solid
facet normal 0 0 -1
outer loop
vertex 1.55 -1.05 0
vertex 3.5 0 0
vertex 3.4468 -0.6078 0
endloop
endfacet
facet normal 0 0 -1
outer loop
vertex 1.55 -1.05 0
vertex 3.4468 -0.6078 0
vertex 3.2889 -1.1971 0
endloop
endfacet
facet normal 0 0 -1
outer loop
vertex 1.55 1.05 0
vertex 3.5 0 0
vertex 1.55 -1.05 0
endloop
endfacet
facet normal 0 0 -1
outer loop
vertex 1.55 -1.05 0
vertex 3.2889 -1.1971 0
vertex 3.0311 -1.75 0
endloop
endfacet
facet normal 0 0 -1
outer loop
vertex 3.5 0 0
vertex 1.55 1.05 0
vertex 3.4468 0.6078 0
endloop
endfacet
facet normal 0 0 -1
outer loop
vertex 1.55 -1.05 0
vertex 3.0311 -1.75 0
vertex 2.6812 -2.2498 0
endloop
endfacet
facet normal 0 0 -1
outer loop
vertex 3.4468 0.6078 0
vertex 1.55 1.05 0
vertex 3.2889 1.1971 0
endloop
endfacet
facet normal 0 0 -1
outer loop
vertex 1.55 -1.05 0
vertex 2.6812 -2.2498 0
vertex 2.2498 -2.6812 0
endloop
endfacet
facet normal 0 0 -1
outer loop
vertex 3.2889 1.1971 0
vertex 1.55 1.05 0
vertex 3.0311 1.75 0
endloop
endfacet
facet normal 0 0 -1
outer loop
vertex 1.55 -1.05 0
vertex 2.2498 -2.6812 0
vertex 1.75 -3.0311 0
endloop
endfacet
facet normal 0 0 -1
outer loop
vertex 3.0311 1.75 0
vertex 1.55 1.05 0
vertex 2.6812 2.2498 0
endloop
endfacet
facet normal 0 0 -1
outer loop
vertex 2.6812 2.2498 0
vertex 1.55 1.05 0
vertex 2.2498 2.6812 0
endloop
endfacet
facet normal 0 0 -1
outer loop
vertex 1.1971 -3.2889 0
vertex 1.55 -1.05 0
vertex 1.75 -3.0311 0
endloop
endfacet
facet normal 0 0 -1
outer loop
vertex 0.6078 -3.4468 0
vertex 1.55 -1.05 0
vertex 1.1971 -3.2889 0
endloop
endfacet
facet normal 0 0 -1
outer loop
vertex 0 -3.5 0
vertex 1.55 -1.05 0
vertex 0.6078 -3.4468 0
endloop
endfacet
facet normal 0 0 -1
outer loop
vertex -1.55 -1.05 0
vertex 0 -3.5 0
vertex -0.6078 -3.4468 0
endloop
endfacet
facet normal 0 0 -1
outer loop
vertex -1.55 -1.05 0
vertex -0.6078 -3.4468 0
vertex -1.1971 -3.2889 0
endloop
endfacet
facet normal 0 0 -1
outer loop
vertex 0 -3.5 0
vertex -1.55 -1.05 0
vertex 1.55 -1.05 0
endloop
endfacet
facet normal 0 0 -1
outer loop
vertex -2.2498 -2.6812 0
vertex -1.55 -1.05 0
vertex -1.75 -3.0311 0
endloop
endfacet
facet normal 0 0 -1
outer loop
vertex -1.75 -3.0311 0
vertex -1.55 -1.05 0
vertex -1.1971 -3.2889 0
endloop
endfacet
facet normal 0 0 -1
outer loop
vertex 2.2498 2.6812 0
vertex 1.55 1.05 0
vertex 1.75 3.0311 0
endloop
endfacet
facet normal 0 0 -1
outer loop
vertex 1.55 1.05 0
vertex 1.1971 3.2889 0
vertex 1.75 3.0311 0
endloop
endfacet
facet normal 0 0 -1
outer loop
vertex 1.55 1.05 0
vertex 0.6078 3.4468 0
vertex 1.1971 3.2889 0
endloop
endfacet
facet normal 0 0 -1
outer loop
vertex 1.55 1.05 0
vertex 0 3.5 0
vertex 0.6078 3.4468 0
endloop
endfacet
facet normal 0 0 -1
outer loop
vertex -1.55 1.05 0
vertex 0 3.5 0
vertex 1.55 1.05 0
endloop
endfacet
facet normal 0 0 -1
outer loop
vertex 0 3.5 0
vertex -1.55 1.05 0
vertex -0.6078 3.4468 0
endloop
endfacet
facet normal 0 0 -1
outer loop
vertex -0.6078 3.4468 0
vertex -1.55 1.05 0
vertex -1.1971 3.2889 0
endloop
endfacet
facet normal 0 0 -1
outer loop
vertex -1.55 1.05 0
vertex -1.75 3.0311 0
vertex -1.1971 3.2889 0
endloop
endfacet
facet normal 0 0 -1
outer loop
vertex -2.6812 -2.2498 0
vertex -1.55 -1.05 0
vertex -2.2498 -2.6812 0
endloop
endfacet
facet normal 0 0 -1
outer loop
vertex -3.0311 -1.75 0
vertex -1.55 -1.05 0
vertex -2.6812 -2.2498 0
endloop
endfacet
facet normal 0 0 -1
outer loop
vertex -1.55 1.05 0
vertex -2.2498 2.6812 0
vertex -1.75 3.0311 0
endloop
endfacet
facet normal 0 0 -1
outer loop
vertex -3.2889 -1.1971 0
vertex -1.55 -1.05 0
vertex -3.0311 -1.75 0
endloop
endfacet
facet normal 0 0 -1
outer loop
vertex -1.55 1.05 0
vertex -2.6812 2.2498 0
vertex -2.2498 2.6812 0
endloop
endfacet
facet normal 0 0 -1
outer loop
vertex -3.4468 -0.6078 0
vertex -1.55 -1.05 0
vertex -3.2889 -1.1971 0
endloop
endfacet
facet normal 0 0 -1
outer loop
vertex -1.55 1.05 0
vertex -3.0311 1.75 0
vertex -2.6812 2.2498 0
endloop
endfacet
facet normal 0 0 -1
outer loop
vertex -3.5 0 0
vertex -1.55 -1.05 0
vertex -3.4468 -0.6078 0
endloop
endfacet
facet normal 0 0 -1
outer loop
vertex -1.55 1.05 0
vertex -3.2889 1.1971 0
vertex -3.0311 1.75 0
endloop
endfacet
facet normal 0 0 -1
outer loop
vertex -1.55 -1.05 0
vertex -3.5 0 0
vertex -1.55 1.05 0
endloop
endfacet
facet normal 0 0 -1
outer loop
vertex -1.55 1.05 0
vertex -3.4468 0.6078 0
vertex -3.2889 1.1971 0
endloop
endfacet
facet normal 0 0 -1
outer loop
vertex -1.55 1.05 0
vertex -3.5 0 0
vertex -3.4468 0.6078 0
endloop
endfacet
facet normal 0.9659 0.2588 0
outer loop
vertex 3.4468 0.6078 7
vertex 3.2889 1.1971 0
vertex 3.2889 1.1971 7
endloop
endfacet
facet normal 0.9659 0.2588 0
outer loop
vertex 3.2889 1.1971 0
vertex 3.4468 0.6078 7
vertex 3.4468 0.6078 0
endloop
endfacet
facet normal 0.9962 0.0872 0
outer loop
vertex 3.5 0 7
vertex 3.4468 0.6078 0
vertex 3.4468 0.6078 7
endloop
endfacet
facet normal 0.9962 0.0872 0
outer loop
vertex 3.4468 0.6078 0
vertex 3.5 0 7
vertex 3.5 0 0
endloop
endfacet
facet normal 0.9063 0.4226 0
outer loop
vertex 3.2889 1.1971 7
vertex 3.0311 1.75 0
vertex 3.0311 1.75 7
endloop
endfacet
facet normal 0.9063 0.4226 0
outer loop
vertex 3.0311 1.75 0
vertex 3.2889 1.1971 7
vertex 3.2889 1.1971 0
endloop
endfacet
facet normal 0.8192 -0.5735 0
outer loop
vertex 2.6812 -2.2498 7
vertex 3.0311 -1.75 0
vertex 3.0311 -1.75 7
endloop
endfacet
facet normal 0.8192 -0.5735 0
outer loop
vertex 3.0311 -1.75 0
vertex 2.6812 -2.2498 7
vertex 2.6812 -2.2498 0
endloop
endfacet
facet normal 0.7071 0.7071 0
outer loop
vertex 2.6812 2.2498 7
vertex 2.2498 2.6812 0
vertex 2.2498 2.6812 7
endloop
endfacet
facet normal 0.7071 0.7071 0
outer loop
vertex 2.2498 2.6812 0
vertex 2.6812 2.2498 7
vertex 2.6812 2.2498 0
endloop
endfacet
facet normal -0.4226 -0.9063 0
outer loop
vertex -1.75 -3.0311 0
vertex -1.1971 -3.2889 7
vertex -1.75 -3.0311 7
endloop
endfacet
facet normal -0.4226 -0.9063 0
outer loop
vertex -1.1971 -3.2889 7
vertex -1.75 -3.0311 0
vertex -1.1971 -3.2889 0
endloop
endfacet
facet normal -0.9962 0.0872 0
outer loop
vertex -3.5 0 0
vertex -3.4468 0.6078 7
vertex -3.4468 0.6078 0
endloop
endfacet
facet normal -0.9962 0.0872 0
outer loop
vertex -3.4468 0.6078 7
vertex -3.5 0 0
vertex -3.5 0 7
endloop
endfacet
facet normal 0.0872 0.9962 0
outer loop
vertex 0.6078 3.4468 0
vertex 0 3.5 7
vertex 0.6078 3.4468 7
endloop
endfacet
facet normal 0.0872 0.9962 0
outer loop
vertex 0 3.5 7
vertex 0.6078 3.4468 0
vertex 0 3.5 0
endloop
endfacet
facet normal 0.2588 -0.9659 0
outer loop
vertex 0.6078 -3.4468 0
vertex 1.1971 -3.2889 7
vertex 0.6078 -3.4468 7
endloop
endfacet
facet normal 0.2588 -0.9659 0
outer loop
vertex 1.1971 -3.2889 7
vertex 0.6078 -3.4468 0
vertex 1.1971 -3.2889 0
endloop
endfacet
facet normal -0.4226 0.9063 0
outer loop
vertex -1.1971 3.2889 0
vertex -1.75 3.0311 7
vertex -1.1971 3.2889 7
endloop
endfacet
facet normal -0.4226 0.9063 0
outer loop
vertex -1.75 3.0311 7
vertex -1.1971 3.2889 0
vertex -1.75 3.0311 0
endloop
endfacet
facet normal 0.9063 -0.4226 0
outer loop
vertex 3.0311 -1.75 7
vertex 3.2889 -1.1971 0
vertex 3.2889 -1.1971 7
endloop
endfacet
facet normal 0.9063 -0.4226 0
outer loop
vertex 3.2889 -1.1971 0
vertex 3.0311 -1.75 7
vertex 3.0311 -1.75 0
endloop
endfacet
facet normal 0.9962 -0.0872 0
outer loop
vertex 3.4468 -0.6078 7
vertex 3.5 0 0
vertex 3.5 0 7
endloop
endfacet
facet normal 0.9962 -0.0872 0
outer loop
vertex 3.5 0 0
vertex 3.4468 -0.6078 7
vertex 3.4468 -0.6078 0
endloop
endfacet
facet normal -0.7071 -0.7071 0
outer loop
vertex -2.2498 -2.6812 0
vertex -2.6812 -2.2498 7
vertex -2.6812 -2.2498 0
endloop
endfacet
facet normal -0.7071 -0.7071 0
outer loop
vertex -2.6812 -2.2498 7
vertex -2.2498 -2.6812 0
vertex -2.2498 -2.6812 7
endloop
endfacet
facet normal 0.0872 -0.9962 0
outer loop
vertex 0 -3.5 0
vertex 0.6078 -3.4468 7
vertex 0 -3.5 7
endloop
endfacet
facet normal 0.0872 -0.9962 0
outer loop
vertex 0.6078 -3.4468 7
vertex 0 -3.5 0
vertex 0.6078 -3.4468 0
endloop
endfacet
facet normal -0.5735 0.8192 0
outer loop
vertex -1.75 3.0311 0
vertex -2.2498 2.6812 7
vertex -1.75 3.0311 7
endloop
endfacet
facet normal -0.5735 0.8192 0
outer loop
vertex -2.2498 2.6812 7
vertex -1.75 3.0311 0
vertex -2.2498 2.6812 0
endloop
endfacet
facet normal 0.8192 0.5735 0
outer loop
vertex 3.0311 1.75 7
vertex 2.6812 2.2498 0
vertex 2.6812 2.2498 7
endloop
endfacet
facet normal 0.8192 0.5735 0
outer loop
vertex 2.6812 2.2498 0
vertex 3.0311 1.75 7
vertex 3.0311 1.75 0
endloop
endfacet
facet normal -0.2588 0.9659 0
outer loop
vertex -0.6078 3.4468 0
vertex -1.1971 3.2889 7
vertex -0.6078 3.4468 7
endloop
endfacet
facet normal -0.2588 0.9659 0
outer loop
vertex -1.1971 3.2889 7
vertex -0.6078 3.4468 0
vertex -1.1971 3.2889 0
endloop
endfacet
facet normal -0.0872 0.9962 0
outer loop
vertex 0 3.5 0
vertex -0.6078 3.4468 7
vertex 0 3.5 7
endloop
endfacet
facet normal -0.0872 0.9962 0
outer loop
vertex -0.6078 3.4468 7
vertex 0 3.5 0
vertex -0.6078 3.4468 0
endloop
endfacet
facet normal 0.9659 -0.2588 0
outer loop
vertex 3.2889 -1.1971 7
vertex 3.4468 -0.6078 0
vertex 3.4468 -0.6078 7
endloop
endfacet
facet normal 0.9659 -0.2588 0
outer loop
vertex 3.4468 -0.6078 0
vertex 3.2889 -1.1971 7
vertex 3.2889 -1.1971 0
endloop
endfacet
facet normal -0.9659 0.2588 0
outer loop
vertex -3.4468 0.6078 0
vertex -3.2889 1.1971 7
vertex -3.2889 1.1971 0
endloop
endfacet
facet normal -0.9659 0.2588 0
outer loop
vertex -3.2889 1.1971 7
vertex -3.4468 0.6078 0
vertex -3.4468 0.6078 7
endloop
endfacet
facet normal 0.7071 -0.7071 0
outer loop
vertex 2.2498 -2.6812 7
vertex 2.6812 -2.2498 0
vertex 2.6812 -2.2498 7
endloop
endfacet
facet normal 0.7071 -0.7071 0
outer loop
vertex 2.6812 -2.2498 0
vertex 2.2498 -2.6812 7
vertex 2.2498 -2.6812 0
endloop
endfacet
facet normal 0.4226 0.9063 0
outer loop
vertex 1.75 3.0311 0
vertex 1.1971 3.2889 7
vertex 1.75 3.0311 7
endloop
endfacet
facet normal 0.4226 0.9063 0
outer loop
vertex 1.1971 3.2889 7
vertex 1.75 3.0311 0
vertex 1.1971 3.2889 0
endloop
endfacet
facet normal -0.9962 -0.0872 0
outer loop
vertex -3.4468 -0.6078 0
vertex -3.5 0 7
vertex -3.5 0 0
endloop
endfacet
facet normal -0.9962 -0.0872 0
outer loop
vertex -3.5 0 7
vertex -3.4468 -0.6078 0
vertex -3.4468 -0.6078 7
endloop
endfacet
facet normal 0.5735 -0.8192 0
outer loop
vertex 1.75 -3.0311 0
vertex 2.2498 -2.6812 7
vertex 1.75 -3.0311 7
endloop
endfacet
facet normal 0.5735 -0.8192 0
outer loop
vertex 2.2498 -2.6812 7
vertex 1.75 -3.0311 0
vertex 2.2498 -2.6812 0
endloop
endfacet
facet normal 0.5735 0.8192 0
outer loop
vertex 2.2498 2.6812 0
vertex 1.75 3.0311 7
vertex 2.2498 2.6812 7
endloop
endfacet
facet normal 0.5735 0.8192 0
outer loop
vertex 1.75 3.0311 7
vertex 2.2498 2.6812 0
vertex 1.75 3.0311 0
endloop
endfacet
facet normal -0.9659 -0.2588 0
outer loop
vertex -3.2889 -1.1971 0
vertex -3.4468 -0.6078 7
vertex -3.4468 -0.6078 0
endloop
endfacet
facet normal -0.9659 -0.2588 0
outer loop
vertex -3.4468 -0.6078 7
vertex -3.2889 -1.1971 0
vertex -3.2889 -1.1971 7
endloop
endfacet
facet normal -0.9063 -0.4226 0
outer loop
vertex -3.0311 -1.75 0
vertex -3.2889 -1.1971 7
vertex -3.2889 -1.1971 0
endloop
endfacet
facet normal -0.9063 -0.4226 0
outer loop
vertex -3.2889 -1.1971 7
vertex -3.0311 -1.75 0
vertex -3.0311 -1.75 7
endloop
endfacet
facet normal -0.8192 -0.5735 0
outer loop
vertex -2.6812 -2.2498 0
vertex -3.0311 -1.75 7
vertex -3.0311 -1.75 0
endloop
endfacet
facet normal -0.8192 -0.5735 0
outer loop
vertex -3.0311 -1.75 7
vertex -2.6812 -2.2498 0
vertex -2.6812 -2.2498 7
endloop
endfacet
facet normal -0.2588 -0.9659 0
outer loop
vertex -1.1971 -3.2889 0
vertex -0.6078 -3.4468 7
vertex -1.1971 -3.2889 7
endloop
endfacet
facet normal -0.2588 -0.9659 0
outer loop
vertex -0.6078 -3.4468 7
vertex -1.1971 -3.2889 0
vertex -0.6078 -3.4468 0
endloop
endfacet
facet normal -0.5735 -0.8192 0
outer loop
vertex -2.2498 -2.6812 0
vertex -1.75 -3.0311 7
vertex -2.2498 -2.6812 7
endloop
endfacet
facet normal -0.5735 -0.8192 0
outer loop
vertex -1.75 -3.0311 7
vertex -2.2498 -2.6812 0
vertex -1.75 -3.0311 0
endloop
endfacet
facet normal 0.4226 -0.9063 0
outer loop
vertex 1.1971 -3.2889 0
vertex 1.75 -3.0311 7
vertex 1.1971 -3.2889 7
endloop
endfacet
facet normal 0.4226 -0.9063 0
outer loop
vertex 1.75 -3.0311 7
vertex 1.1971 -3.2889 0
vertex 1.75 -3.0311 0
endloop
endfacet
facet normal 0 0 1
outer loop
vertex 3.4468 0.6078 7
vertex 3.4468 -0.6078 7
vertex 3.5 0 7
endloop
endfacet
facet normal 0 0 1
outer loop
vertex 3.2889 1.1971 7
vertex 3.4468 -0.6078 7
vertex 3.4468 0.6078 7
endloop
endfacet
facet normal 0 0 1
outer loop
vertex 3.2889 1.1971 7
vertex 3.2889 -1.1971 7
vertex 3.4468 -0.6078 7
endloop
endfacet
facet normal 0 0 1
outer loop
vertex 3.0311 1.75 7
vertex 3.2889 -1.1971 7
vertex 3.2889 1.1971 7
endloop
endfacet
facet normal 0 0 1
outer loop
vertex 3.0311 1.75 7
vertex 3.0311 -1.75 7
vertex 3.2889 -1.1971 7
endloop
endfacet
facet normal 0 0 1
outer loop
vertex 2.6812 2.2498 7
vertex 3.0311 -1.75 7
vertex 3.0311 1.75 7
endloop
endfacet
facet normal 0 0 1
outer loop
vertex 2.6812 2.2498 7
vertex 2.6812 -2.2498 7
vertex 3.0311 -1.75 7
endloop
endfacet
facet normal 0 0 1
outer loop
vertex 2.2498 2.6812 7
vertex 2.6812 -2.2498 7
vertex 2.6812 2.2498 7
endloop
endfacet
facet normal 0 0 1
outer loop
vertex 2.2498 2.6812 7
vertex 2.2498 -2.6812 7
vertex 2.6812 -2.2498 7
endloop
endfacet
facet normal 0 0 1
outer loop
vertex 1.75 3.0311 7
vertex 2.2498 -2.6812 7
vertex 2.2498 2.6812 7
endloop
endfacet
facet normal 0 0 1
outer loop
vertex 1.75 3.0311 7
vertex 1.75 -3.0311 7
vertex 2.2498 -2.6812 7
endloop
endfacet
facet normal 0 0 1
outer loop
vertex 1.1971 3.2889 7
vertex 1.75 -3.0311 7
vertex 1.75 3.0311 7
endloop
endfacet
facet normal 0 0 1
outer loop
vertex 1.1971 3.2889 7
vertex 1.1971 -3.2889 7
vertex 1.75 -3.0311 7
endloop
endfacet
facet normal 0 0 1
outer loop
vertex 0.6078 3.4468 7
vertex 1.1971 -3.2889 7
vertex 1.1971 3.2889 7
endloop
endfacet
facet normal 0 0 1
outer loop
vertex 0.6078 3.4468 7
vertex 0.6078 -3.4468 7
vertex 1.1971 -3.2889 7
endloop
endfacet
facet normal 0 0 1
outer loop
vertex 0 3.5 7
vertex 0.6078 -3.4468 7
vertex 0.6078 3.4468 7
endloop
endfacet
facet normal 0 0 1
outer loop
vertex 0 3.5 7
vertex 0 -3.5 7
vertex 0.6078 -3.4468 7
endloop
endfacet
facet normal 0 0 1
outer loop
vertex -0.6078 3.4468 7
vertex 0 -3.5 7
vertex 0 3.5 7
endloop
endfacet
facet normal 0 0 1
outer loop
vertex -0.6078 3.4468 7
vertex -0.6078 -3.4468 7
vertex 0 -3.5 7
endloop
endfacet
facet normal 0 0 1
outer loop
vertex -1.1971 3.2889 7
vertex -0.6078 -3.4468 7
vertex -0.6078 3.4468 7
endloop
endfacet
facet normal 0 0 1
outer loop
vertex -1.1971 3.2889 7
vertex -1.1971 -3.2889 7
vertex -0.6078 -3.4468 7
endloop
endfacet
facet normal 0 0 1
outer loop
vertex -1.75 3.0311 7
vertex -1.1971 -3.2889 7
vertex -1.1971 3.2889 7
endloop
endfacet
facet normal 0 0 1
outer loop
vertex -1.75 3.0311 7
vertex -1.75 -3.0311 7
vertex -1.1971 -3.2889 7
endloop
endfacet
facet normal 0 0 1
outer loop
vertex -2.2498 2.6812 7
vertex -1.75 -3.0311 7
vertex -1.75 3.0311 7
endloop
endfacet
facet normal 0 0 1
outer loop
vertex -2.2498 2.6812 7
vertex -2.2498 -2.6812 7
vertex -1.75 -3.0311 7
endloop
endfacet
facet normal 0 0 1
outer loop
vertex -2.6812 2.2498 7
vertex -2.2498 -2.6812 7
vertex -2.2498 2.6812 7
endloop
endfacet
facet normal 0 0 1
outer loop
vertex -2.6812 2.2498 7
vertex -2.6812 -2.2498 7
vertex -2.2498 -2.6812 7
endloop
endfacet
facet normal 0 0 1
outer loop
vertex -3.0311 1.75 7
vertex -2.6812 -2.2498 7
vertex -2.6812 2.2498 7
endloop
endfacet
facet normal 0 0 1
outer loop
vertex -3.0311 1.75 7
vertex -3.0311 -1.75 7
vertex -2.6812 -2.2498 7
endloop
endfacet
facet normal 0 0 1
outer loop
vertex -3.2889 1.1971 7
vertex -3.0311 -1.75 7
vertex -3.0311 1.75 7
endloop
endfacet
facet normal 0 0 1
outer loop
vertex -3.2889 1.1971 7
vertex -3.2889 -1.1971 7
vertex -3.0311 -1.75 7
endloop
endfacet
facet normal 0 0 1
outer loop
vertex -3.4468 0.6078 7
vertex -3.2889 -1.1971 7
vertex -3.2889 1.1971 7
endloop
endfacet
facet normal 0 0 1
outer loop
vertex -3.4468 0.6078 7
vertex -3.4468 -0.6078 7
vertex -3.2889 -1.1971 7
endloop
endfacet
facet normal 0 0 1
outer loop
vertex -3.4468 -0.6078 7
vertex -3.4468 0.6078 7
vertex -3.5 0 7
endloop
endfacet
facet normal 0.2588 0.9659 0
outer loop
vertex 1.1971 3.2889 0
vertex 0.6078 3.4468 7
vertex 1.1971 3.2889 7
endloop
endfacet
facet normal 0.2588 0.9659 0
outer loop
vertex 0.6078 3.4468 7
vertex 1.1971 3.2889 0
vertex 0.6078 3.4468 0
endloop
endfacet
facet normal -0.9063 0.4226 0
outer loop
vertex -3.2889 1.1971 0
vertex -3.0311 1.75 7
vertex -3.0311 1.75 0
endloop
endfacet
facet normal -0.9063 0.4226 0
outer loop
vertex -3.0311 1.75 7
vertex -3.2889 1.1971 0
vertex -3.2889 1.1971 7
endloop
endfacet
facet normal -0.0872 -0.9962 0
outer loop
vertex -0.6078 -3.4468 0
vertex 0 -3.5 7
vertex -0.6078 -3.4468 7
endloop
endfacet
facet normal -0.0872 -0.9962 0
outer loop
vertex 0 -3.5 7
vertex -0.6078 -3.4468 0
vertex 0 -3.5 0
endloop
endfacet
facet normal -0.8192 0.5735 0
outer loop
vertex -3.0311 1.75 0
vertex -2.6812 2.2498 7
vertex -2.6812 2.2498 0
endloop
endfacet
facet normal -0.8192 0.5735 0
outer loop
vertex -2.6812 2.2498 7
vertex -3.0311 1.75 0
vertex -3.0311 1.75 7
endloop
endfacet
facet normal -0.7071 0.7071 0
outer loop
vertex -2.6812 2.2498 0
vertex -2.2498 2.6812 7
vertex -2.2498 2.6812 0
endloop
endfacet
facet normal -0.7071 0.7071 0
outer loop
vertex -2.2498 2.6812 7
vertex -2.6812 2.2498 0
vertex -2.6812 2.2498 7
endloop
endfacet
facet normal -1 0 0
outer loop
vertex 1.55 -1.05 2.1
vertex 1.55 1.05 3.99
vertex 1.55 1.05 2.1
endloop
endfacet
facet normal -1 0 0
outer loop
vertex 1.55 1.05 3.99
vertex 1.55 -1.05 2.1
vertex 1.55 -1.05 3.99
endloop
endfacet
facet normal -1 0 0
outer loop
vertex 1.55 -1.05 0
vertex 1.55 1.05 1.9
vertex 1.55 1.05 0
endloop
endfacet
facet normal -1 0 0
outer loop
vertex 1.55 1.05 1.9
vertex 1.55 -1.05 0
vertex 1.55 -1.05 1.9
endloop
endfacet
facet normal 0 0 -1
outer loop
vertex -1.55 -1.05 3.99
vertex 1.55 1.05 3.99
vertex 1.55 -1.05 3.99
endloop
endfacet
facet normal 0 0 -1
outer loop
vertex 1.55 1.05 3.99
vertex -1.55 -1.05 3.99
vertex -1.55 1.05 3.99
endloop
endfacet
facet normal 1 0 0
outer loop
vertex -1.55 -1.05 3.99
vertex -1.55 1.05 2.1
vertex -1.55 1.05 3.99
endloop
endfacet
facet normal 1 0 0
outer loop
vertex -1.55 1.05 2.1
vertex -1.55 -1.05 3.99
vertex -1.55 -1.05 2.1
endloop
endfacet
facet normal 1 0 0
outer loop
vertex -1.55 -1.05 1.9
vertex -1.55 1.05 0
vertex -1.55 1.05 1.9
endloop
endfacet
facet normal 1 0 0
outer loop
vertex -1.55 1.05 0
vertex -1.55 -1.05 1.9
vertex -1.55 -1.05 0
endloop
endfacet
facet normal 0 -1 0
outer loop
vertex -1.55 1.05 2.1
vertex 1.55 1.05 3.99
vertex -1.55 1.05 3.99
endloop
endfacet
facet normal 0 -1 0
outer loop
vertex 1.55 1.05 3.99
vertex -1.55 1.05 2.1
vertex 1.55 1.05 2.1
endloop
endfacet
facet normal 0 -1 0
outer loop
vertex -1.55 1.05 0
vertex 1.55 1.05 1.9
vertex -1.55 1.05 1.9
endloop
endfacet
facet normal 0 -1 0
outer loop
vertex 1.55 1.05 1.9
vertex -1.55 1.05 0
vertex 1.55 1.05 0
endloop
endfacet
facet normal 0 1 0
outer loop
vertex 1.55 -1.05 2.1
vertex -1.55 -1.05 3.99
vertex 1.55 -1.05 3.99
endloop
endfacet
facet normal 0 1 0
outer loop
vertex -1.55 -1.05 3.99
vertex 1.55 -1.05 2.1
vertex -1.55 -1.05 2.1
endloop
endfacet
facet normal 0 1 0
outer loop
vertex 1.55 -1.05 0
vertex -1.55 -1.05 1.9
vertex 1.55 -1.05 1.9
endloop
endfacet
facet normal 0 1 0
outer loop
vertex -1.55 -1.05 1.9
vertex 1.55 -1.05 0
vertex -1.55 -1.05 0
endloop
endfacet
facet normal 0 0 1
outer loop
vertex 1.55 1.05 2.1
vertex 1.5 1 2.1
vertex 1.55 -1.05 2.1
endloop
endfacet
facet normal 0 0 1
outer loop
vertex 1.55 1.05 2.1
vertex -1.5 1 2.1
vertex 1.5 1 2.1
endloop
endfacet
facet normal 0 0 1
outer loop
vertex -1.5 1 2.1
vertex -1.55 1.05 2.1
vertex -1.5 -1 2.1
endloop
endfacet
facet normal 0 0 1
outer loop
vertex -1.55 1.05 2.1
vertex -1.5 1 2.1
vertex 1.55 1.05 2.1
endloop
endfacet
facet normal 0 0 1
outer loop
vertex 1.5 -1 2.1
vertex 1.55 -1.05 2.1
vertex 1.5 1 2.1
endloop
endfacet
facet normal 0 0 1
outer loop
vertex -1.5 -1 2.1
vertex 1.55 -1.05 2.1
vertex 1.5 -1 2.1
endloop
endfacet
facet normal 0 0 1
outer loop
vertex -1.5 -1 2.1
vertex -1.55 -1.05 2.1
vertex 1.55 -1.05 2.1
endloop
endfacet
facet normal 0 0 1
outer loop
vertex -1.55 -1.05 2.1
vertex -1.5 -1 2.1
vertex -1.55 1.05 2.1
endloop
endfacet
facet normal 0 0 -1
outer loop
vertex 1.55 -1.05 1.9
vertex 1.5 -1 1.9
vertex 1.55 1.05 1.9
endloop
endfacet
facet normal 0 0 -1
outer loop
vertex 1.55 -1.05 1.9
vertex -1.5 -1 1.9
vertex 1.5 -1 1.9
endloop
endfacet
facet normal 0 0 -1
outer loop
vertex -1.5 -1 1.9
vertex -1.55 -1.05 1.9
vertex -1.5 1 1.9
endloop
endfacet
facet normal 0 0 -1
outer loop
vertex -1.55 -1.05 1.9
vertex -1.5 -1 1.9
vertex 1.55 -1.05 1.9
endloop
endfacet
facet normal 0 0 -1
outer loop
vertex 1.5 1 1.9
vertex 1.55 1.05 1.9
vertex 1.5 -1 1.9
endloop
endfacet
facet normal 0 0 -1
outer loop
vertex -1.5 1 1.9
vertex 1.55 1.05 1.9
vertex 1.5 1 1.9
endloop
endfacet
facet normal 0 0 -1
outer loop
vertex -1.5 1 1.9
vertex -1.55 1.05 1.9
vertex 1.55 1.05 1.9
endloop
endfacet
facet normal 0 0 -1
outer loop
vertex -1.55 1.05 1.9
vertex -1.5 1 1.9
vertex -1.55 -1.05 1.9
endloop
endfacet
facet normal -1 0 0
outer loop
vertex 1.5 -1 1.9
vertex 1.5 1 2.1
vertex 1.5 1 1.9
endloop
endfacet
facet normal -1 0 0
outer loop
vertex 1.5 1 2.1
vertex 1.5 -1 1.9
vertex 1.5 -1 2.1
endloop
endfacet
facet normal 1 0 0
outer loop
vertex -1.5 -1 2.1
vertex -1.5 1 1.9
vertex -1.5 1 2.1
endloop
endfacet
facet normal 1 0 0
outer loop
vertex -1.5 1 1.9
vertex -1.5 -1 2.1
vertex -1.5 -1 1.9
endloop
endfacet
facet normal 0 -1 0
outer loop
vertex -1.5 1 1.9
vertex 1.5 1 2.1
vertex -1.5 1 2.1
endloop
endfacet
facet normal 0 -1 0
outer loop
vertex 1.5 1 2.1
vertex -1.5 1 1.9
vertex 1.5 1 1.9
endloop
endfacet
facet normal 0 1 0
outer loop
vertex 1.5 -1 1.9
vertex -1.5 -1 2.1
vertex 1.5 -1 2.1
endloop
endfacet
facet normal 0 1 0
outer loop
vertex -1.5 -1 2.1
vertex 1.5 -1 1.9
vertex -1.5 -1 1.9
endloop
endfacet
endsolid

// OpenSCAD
// Push Button Cap for 8mm hole and 3x2mm switch stem

$fn=36;

union() {
    difference() {
        translate([0,0,3.5]) {
            cylinder(7, 3.5, 3.5, center=true);
        }
        translate([0, 0, 1.99]) {
            cube([3.1, 2.1, 4], center=true);
        }
    }
    color([0,0,1]) {
        difference() {
            translate([0,0,2]) {
                cube([4, 4, 0.2], center=true);
            }
            translate([0,0,2.5]) {
                cube([3, 2, 10], center=true);
            }
        }
}
}
